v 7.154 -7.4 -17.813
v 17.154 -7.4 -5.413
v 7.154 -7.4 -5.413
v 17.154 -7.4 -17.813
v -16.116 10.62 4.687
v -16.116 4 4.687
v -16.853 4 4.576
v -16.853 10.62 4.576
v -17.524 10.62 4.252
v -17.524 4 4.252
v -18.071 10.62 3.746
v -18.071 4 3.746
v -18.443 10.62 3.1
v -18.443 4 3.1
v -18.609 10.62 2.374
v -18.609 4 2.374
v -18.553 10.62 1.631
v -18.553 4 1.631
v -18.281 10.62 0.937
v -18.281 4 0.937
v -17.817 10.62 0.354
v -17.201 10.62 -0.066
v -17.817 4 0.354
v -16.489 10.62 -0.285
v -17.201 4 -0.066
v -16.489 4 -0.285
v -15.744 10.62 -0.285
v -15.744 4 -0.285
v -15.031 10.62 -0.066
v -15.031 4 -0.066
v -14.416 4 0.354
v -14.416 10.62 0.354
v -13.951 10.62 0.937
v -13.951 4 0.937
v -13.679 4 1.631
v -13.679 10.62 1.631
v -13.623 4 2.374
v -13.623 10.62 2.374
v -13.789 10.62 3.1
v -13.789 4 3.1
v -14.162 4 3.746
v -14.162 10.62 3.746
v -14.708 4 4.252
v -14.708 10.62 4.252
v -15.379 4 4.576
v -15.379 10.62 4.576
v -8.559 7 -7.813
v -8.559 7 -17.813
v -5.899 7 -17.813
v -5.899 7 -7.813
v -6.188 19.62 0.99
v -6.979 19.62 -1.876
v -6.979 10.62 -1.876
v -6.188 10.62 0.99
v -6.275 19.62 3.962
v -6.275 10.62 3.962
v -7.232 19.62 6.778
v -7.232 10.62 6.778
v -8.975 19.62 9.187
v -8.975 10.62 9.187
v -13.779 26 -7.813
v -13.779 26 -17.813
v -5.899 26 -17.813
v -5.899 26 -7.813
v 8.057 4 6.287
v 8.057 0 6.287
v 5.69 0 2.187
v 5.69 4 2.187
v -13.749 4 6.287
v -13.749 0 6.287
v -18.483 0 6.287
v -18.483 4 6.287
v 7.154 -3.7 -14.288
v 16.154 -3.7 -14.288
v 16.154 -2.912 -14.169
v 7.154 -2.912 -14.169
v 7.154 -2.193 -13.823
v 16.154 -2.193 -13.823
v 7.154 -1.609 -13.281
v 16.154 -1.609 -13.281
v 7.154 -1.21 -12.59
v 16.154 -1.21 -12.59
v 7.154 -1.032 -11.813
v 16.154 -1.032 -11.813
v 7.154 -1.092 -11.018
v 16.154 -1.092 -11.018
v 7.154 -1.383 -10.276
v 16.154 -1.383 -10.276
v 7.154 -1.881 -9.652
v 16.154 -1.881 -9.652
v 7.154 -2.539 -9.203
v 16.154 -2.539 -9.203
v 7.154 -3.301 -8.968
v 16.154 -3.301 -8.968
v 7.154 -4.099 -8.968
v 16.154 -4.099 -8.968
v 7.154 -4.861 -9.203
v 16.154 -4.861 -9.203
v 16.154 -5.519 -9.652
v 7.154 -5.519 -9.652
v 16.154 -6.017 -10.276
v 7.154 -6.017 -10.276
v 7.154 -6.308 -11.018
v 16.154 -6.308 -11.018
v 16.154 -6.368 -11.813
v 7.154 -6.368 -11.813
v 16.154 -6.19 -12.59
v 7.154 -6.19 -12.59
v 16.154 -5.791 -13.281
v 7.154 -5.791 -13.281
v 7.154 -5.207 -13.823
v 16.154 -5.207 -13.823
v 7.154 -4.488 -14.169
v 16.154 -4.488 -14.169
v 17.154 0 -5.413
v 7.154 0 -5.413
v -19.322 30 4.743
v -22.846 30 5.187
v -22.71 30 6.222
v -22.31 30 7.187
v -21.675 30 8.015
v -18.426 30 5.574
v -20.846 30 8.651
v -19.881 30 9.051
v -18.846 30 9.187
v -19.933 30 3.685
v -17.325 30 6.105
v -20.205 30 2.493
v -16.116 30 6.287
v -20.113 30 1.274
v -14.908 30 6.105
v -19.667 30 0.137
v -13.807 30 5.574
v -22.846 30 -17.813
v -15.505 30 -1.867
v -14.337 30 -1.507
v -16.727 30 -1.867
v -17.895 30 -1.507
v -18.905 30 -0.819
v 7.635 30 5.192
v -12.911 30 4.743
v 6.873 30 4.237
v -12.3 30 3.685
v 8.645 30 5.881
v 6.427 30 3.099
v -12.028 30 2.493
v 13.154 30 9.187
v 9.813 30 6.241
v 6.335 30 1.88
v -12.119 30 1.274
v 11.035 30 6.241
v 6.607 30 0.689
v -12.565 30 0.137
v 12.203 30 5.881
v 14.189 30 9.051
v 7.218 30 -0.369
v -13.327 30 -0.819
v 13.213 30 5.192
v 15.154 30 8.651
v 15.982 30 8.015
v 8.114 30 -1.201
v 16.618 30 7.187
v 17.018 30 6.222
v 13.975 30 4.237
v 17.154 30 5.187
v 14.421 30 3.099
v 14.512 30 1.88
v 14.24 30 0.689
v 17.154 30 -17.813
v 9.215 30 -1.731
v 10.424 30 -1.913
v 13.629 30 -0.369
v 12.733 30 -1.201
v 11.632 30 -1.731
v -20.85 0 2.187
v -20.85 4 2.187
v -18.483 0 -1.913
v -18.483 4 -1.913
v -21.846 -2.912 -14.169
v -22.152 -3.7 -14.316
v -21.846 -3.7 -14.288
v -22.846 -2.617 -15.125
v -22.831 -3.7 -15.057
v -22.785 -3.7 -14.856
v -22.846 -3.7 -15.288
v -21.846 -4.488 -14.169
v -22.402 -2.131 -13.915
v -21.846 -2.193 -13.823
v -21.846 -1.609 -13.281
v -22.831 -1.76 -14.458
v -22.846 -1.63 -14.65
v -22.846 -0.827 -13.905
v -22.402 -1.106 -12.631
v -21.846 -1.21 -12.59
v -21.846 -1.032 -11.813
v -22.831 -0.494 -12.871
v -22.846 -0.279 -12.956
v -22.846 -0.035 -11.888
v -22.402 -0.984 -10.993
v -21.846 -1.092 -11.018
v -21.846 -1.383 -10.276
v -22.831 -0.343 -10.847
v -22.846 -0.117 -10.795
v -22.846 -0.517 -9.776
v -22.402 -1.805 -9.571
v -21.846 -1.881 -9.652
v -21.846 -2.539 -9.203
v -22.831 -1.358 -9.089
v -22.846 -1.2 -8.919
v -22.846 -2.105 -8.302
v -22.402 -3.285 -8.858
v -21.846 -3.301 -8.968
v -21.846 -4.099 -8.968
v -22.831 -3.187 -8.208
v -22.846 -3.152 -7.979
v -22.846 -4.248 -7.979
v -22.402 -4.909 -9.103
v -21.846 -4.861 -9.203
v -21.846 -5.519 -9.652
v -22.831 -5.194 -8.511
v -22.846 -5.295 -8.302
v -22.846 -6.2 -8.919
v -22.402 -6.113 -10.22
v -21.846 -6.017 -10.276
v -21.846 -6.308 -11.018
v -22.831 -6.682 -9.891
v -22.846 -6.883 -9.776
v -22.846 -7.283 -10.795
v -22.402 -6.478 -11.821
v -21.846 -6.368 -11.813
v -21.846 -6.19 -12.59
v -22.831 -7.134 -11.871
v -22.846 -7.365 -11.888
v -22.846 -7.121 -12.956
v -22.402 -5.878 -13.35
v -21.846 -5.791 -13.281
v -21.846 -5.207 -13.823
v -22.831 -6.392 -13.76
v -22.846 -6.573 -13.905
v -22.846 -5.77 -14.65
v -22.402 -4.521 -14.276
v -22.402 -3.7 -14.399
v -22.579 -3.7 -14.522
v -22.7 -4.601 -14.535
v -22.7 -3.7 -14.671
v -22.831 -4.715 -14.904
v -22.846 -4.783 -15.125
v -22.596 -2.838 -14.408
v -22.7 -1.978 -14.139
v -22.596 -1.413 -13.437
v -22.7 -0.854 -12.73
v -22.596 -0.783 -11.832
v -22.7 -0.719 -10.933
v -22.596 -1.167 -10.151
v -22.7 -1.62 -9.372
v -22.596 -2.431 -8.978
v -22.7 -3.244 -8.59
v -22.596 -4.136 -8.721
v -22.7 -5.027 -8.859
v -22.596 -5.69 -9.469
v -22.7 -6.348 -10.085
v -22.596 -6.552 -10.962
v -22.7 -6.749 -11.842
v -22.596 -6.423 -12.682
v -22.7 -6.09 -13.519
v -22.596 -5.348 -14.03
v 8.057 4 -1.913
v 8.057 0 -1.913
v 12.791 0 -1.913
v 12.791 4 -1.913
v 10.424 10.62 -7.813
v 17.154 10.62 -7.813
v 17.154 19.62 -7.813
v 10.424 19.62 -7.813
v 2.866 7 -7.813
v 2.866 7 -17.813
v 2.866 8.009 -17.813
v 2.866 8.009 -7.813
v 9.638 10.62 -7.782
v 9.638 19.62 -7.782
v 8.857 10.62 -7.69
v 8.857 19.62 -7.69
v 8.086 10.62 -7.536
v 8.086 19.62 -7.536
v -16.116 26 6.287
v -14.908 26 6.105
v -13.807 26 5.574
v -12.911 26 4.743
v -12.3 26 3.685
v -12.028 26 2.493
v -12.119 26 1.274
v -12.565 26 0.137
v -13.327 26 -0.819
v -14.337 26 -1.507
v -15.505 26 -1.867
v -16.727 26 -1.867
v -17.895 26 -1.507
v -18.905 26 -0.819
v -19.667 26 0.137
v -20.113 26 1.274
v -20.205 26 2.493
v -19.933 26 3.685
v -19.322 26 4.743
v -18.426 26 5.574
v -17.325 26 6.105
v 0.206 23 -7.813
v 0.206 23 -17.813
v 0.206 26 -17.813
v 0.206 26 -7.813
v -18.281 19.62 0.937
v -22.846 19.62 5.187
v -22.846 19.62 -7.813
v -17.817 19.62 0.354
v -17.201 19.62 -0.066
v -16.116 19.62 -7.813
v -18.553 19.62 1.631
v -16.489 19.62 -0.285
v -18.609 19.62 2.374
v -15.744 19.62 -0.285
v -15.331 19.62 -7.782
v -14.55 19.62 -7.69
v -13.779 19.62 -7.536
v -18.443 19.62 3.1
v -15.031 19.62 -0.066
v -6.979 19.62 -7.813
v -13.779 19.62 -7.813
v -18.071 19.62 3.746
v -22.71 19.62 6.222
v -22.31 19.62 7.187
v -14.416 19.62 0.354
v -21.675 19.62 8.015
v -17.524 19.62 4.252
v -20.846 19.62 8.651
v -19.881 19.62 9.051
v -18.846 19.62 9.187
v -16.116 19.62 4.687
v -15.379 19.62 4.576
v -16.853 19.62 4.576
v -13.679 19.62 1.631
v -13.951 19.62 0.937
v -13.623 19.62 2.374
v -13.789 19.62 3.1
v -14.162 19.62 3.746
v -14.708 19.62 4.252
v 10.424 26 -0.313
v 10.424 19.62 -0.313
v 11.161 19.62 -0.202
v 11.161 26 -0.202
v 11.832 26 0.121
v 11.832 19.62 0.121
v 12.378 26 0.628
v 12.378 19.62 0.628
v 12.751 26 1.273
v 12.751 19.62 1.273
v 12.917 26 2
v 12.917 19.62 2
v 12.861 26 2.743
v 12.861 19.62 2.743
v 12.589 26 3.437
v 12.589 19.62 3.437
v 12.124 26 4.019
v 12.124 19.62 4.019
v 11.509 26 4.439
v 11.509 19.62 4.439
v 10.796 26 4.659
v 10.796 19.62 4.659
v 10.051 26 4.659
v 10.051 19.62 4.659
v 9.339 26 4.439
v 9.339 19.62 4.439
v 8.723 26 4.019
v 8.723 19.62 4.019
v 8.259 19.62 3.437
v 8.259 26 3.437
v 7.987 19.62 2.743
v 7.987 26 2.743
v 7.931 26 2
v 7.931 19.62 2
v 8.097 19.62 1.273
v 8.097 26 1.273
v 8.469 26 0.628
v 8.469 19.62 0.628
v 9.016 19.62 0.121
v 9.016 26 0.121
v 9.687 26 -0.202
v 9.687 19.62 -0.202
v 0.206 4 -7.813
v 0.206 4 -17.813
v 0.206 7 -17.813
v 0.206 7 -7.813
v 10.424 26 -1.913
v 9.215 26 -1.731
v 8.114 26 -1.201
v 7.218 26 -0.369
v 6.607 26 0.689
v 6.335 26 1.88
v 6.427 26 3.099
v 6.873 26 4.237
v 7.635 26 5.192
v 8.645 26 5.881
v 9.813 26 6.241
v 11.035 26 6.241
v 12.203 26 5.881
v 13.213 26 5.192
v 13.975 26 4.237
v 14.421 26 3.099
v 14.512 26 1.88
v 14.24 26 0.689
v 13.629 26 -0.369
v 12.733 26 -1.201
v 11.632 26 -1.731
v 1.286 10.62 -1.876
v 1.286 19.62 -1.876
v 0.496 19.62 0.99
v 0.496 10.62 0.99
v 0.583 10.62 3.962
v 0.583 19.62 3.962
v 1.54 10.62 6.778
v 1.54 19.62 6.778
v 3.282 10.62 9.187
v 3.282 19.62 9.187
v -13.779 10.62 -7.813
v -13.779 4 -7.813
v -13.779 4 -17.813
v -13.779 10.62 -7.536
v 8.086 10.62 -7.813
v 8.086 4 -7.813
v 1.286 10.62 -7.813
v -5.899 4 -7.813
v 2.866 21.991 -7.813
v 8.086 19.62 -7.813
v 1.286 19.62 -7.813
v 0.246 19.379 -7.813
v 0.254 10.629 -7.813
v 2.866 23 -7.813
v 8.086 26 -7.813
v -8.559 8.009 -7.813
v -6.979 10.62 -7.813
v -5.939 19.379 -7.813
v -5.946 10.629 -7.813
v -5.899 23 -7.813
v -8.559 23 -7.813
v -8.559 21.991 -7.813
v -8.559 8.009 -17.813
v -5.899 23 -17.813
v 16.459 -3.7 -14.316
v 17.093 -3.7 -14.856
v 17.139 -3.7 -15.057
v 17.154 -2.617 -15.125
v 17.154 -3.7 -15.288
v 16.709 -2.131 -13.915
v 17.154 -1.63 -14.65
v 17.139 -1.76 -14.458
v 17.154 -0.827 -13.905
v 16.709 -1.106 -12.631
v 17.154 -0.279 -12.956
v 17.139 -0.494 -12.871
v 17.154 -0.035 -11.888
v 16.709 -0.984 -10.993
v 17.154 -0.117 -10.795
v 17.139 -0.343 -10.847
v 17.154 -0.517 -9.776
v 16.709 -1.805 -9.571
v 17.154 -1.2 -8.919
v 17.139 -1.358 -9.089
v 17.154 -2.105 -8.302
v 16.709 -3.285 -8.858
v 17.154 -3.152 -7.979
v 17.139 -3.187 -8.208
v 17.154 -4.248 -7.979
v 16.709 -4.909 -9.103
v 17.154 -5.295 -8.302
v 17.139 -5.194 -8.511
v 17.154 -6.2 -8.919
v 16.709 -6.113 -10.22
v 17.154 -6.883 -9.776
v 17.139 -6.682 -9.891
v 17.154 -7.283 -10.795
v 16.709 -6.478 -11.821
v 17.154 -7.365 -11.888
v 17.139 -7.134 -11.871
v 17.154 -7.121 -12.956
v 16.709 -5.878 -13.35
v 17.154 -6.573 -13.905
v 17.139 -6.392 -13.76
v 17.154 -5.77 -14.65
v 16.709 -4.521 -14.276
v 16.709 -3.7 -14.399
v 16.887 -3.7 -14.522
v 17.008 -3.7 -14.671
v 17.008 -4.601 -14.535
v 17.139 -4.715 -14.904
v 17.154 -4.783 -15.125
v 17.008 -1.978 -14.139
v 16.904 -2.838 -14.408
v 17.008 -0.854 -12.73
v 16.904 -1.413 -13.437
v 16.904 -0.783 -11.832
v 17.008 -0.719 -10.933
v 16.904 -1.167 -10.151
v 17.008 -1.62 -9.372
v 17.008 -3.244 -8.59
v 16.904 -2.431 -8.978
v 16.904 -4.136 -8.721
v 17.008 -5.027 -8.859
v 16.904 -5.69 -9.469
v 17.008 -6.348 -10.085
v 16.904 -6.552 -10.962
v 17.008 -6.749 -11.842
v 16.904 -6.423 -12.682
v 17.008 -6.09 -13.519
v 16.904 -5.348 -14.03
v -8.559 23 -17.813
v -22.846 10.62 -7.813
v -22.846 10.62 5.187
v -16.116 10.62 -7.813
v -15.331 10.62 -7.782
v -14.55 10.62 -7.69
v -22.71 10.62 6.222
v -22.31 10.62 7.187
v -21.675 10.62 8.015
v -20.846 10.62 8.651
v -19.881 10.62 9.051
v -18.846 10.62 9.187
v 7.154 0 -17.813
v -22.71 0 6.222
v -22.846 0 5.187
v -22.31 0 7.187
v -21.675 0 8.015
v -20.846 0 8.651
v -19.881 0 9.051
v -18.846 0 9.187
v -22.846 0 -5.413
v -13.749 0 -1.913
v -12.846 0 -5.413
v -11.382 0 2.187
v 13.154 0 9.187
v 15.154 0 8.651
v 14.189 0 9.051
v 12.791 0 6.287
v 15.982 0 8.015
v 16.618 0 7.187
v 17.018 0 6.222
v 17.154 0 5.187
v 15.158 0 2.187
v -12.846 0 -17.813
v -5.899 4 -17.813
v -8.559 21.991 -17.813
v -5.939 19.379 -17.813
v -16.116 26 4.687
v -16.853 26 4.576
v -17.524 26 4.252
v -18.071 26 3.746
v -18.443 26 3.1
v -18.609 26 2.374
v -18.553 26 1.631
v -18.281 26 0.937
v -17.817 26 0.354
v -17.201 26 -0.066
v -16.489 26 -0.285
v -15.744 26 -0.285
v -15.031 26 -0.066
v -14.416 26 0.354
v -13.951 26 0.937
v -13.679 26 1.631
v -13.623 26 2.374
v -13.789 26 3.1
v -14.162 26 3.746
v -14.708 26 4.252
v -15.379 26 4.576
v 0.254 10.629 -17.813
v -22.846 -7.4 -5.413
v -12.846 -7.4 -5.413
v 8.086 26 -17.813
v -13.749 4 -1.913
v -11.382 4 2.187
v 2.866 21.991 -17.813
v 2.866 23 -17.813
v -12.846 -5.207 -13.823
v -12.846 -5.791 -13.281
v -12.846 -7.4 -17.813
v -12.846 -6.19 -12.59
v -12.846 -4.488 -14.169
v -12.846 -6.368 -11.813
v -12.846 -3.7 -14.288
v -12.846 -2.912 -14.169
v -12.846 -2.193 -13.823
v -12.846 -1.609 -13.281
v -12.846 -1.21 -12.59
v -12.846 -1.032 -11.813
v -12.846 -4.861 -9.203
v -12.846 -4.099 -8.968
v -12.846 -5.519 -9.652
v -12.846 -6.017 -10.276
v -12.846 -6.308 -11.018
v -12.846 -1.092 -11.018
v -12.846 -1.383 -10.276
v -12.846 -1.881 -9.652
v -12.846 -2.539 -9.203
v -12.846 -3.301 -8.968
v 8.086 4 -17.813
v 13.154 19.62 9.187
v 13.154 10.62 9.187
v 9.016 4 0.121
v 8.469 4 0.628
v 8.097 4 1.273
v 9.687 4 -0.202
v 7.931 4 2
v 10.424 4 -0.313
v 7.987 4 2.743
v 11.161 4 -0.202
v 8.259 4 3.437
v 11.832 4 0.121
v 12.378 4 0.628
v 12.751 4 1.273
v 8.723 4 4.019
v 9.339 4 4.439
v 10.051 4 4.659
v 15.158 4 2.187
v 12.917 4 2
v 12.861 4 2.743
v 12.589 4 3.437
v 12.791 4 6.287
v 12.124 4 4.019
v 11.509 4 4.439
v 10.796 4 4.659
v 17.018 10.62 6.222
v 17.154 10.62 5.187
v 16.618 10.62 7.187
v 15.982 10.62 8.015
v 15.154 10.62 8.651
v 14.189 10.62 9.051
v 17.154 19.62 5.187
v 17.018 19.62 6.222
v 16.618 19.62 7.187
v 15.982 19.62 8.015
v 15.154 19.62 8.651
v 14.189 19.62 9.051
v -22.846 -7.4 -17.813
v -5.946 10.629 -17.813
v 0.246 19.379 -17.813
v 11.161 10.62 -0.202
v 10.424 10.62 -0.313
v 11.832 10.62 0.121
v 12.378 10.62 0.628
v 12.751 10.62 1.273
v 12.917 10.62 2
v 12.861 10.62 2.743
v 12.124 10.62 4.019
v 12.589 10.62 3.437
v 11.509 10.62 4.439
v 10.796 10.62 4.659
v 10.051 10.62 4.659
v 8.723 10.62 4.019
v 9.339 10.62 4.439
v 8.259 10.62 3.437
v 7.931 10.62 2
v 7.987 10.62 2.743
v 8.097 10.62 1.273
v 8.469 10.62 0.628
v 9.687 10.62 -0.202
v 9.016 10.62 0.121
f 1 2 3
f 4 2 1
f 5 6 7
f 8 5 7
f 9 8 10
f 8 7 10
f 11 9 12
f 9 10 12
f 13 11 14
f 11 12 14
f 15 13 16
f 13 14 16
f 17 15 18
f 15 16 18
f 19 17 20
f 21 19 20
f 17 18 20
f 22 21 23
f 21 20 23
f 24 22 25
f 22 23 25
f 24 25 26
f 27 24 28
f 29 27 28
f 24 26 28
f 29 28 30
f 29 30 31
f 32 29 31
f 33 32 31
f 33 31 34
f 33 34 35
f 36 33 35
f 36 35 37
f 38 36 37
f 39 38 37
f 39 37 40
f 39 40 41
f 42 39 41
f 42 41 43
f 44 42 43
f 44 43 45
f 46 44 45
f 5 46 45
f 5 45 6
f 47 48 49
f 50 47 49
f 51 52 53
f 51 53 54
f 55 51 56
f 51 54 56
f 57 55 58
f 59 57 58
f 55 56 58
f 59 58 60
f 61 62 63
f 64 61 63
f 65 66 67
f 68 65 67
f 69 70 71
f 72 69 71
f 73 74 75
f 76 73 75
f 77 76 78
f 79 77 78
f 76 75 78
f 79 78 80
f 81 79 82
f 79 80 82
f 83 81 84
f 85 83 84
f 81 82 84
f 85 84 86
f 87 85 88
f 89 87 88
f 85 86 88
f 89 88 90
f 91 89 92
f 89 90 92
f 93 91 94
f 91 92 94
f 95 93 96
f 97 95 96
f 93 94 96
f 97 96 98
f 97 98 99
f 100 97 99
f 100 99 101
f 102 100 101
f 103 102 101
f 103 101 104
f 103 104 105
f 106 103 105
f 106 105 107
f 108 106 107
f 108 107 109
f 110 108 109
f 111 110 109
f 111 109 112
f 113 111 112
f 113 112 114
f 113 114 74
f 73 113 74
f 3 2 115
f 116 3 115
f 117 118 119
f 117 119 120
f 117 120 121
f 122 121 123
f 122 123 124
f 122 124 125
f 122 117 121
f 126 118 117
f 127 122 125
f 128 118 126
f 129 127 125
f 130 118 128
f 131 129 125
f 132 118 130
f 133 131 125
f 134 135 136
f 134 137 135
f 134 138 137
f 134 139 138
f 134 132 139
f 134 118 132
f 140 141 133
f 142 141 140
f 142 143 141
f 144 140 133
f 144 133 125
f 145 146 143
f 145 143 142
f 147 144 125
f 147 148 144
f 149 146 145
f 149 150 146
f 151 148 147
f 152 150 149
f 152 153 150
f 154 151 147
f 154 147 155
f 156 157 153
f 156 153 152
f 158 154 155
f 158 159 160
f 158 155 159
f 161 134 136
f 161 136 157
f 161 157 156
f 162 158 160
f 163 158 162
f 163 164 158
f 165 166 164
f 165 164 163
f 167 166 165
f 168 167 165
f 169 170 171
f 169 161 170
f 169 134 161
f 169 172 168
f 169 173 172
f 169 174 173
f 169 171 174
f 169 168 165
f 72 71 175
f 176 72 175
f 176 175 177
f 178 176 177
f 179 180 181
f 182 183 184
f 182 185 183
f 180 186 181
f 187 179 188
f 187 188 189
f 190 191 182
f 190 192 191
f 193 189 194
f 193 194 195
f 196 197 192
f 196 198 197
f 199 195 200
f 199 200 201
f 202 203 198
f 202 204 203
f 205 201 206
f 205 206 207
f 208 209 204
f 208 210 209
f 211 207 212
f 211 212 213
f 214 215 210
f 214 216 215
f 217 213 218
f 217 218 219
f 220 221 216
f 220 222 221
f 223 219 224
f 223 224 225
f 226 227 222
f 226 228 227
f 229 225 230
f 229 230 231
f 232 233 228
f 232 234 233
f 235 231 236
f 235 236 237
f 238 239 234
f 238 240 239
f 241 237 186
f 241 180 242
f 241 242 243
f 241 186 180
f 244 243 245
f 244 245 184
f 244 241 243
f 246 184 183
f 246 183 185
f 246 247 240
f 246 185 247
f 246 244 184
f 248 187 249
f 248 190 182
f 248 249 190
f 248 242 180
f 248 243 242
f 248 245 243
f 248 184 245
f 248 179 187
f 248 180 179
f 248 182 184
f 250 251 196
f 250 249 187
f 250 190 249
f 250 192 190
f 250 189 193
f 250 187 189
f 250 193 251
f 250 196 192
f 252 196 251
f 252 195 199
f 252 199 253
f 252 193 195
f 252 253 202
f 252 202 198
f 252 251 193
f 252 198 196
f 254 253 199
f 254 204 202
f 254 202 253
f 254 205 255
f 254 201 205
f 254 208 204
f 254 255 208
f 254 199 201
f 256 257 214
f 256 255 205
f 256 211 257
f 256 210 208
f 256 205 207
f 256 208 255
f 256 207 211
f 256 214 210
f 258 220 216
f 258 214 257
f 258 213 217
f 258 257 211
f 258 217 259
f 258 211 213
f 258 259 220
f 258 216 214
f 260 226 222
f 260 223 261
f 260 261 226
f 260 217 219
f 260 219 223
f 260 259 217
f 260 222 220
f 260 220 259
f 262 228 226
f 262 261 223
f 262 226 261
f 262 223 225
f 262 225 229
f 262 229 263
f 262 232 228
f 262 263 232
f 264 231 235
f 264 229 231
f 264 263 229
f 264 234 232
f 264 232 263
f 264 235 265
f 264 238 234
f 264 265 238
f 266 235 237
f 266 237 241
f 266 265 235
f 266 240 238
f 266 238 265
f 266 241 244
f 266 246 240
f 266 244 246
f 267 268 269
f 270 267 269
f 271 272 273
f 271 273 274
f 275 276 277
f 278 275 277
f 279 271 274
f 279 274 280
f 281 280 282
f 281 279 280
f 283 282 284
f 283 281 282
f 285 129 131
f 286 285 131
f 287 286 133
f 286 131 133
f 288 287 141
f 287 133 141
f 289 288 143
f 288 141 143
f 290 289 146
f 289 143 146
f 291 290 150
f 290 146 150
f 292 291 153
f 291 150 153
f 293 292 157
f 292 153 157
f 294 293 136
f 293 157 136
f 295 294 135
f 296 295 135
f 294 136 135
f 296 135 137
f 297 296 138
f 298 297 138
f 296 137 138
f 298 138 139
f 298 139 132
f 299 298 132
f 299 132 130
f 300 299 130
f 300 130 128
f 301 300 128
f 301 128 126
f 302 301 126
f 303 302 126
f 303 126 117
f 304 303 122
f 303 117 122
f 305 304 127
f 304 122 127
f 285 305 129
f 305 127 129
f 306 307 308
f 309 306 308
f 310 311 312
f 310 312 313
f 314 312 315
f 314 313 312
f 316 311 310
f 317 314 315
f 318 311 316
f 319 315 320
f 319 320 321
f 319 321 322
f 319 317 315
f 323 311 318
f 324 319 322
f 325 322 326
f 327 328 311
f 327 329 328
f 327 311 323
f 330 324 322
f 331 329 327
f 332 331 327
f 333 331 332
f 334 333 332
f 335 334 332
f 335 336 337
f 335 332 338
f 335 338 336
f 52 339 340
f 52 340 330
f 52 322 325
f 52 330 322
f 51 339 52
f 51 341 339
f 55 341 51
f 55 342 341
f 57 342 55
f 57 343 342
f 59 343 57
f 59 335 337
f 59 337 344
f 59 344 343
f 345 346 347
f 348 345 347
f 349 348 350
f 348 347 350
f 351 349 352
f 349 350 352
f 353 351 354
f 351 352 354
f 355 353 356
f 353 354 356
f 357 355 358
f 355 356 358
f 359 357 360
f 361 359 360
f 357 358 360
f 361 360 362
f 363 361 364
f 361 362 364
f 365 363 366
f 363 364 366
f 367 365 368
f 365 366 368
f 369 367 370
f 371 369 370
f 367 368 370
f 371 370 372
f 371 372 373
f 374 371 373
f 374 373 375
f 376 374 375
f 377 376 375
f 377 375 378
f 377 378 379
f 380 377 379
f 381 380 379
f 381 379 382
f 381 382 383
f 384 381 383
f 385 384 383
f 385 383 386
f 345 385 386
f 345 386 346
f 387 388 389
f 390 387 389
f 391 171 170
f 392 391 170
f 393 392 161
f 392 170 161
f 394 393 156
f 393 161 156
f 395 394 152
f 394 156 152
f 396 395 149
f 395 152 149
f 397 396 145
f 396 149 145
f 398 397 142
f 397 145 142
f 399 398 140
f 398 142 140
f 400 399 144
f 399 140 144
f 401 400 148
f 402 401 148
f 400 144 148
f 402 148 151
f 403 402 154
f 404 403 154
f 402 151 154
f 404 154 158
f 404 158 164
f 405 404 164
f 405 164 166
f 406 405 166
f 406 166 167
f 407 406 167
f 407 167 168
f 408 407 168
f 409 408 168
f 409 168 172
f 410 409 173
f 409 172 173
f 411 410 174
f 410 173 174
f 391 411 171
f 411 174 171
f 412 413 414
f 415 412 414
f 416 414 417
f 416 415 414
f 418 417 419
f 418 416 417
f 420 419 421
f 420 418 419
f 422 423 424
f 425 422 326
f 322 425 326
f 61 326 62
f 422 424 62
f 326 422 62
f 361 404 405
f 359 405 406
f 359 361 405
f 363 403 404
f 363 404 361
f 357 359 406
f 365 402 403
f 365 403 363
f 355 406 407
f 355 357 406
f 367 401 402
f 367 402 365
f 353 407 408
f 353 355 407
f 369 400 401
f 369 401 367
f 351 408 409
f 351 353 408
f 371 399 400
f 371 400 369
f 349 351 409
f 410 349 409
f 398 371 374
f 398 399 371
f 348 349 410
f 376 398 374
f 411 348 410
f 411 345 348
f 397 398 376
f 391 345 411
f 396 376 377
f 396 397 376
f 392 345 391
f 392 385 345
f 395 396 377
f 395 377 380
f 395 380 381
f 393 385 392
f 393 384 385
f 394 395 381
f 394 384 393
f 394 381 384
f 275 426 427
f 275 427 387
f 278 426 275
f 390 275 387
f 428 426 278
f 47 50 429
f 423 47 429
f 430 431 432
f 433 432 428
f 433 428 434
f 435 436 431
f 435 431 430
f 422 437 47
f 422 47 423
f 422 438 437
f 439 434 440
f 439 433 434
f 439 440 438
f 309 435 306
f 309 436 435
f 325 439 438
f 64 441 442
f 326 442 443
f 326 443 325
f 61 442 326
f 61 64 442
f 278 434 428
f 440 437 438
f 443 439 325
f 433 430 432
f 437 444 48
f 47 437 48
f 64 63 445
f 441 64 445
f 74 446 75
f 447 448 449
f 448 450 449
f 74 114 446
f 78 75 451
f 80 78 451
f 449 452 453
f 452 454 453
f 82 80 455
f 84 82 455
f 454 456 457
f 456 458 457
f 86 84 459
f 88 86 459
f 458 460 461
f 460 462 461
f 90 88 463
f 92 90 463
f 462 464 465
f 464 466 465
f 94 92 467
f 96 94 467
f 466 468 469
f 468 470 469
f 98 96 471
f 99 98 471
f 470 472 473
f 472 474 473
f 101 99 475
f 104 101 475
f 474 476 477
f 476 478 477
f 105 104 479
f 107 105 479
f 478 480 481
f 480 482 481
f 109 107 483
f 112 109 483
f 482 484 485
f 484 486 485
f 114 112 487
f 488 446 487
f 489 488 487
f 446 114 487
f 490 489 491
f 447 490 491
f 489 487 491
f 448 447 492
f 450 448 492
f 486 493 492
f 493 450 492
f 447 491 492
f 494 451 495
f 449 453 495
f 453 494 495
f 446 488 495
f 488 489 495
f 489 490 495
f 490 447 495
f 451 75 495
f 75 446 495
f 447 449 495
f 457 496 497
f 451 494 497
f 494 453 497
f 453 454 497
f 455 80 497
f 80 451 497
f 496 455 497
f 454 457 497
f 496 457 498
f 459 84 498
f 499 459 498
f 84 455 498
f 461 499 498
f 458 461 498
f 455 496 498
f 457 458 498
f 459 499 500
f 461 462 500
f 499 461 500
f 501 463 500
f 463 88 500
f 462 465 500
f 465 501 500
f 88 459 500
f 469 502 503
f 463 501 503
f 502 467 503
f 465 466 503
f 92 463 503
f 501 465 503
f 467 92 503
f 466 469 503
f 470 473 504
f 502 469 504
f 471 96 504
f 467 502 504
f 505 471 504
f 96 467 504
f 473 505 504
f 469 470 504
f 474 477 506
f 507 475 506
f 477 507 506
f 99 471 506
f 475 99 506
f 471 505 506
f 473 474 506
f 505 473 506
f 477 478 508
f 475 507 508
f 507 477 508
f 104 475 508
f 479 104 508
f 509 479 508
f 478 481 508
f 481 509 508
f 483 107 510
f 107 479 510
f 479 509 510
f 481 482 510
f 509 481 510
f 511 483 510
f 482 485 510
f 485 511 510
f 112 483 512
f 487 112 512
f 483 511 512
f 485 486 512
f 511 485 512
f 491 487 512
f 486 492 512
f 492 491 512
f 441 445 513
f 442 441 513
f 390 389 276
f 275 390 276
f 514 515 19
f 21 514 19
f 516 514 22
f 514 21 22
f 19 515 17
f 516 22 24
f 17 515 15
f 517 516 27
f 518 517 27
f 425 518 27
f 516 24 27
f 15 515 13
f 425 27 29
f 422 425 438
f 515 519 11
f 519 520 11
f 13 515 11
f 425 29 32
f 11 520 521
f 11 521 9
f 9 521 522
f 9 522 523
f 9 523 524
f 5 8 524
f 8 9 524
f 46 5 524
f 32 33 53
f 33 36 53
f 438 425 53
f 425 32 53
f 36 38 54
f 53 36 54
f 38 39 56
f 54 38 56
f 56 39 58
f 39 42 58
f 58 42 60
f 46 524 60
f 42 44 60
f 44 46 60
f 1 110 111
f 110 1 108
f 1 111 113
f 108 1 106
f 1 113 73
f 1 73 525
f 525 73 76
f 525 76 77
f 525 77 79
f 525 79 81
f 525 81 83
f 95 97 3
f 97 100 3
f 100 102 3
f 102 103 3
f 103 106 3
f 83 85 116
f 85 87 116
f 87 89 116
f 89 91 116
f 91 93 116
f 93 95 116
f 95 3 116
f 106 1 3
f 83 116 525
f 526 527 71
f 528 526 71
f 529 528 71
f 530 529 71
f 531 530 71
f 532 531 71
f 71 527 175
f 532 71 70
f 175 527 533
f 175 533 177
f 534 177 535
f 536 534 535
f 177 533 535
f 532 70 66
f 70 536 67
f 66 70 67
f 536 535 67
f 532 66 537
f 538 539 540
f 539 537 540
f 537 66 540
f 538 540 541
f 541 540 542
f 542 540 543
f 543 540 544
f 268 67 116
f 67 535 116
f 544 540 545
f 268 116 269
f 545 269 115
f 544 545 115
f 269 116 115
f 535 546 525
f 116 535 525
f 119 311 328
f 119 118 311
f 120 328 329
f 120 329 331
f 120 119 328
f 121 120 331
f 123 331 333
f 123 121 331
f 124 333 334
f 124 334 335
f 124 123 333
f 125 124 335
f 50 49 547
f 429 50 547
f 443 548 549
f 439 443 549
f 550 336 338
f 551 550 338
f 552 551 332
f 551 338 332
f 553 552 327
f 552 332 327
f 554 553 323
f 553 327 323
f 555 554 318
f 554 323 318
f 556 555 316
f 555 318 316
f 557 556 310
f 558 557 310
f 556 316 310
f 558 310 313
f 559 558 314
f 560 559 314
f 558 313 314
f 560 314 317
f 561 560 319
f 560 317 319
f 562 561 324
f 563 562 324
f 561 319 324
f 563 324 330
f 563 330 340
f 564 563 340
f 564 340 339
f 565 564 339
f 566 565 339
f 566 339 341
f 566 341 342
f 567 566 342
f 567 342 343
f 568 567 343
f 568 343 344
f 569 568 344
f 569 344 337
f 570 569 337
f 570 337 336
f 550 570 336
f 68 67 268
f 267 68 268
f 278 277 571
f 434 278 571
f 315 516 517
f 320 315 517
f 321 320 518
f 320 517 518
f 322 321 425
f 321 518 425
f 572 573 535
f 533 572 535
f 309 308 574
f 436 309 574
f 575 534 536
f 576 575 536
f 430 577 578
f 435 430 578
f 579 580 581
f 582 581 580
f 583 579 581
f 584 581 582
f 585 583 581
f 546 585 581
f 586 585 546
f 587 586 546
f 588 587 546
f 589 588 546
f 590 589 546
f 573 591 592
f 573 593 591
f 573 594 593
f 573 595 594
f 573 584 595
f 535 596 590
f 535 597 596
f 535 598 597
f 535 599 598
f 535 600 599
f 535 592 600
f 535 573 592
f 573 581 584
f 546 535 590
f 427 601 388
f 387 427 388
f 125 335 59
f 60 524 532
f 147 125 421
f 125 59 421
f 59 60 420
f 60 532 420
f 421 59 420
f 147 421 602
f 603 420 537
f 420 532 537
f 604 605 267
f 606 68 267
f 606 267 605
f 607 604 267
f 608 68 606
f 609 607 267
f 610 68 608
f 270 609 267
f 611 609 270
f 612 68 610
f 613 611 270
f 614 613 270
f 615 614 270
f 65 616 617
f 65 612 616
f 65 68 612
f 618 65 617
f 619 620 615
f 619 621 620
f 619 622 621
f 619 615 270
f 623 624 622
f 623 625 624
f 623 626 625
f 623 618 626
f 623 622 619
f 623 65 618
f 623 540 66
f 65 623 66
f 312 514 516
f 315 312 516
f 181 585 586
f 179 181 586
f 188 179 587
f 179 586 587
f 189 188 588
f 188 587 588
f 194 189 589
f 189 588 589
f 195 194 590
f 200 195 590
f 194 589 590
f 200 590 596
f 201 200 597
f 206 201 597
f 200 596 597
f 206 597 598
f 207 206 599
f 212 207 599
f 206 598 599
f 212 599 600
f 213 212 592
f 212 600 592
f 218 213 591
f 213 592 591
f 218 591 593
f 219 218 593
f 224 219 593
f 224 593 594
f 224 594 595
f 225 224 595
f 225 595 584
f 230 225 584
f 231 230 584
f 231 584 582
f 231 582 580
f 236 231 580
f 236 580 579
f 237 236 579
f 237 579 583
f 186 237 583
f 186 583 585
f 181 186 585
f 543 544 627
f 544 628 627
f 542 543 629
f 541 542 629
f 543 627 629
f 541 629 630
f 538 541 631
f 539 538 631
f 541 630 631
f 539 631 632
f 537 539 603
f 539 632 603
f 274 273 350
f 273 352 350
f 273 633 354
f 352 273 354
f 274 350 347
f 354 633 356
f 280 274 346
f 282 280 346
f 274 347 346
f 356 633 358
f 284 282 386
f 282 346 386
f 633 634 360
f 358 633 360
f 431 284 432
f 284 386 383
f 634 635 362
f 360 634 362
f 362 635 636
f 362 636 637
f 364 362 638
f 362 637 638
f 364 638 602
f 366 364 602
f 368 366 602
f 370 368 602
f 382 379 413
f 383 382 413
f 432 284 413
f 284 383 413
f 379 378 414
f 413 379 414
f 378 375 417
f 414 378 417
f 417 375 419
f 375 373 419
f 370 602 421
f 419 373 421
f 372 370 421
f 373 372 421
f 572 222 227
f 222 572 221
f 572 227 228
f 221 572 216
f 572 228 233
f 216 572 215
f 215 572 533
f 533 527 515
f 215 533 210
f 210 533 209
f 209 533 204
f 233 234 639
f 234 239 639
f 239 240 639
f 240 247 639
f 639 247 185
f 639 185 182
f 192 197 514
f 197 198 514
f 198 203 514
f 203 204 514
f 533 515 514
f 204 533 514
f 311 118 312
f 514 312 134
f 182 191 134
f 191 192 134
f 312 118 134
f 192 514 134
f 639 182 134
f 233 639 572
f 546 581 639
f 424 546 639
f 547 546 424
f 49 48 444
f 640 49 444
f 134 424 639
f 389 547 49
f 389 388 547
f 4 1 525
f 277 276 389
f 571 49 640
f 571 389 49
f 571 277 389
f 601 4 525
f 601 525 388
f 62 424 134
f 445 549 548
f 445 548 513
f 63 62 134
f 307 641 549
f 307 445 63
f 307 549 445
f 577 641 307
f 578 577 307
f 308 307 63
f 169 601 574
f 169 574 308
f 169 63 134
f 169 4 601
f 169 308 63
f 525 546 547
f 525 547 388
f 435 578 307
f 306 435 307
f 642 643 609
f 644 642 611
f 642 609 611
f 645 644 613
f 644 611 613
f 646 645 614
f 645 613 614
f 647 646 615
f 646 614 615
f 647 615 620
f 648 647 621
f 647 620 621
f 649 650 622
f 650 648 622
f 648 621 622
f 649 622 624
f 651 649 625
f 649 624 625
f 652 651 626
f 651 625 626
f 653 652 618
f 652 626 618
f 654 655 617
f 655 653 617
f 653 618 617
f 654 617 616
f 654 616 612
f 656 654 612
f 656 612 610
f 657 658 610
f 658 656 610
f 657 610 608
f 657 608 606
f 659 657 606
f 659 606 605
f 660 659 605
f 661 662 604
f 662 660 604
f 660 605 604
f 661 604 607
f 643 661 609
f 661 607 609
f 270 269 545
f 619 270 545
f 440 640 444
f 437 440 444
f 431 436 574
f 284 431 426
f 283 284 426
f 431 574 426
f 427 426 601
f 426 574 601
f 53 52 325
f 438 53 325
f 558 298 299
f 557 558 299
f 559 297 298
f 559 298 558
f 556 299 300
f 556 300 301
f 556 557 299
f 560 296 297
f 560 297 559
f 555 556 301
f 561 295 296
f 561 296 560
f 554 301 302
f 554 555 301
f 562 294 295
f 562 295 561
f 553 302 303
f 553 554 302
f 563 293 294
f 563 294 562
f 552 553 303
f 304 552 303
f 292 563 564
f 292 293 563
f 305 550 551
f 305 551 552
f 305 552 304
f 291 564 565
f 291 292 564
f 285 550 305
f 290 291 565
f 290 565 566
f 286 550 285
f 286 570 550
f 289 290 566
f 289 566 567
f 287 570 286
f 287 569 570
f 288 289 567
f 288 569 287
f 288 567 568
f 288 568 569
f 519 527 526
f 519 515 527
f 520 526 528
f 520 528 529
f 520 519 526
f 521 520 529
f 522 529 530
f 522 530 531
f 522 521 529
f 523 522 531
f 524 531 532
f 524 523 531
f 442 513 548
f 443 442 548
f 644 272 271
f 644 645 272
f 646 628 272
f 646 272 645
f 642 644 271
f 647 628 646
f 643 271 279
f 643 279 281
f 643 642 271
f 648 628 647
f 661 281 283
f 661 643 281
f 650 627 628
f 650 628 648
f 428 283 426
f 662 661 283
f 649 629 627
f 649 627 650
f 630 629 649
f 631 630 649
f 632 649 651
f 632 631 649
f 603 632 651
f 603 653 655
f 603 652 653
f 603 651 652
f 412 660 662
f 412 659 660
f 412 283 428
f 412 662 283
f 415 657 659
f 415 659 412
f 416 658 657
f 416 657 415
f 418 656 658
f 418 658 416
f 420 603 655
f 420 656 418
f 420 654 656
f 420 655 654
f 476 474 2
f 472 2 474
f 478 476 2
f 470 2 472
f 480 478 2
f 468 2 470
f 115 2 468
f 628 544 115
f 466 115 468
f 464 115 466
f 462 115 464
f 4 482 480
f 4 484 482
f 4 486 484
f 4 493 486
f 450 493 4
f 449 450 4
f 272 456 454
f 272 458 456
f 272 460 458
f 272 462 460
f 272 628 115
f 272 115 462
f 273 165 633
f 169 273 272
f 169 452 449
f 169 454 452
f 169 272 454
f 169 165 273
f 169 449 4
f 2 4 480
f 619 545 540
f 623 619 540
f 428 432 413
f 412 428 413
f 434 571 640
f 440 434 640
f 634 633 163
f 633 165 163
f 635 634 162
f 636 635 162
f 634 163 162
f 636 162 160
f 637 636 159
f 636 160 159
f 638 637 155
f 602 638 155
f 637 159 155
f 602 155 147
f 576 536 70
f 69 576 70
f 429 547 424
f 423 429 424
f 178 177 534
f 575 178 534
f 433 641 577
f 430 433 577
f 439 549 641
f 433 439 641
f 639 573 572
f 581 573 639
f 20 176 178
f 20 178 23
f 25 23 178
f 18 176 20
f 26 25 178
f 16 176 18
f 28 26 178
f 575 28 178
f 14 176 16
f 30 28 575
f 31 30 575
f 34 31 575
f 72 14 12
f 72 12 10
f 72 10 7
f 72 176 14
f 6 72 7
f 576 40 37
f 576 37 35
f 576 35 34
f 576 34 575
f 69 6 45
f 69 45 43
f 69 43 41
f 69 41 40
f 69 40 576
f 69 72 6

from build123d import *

# Parameters (mm, degrees)
SKETCH1_W           = 40
SKETCH1_H           = 27
BOSS_EXTRUDE1_DEPTH = 30
CUT_EXTRUDE1_DEPTH  = 10
SKETCH3_R           = 2.5
CUT_EXTRUDE2_DEPTH  = 30
CUT_EXTRUDE5_START  = -10.62
CUT_EXTRUDE5_DEPTH  = 9
SKETCH10_W          = 20
SKETCH10_H          = 9
CUT_EXTRUDE7_DEPTH  = 6.8
SKETCH12_W          = 20
SKETCH12_H          = 9
CUT_EXTRUDE10_DEPTH = 6.8
FILLET1_R           = 4
SKETCH13_W          = 12.4
SKETCH13_H          = 7.4
SKETCH13_R          = 2.675
BOSS_EXTRUDE2_DEPTH = 40
CUT_EXTRUDE11_REACH = 42.436
SKETCH14_W          = 20
SKETCH14_H          = 7.4
SKETCH15_R          = 4.1
CUT_EXTRUDE12_DEPTH = 4
SKETCH16_R          = 2.5
CUT_EXTRUDE13_DEPTH = 4
FILLET2_SIZE        = 1


with BuildPart() as part:
    # Sketch1 → Boss-Extrude1 (new body)
    with BuildSketch(Plane(origin=(0, 0, 0), x_dir=(1, 0, 0), z_dir=(0, 1, 0))):
        with Locations((-2.846153846, 4.313186813)):
            Rectangle(SKETCH1_W, SKETCH1_H)
    extrude(amount=BOSS_EXTRUDE1_DEPTH)

    # Sketch2 → Cut-Extrude1 (cut)
    with BuildSketch(Plane(origin=(0, 0, -17.813186813), x_dir=(-1, 0, 0), z_dir=(0, 0, -1))):
        Polygon((-8.086431081, 26), (-8.086431081, 4), (-0.206431081, 4), (-0.206431081, 7), (-2.866431081, 7), (-2.866431081, 8.008707537), (-0.253846154, 10.628707537), (5.946153846, 10.628707537), (8.558738773, 8.008707537), (8.558738773, 7), (5.898738773, 7), (5.898738773, 4), (13.778738773, 4), (13.778738773, 26), (5.898738773, 26), (5.898738773, 23), (8.558738773, 23), (8.558738773, 21.991292463), (5.938738773, 19.378707537), (-0.246431081, 19.378707537), (-2.866431081, 21.991292463), (-2.866431081, 23), (-0.206431081, 23), (-0.206431081, 26), align=None)
    extrude(amount=-CUT_EXTRUDE1_DEPTH, mode=Mode.SUBTRACT)

    # Sketch3 → Cut-Extrude2 (cut)
    with BuildSketch(Plane.XZ):
        with Locations(Location((10.423846154, 2.186813187, 0), (0, 0, 270))):
            Circle(SKETCH3_R)
        with Locations(Location((-16.116153846, 2.186813187, 0), (0, 0, 90))):
            Circle(SKETCH3_R)
    extrude(amount=-CUT_EXTRUDE2_DEPTH, mode=Mode.SUBTRACT)

    # Sketch8 → Cut-Extrude5 (cut)
    with BuildSketch(Plane.XZ.offset(CUT_EXTRUDE5_START)):
        with BuildLine():
            Line((3.282417725, 9.186813187), (17.153846154, 9.186813187))
            Line((17.153846154, 9.186813187), (17.153846154, -7.813186813))
            Line((17.153846154, -7.813186813), (10.423846154, -7.813186813))
            ThreePointArc((10.423846154, -7.813186813), (1.204301697, -1.686170159), (3.282417725, 9.186813187))
        make_face()
        with BuildLine():
            Line((-22.846153846, -7.813186813), (-16.116153846, -7.813186813))
            ThreePointArc((-16.116153846, -7.813186813), (-6.896609389, -1.686170159), (-8.974725418, 9.186813187))
            Line((-8.974725418, 9.186813187), (-22.846153846, 9.186813187))
            Line((-22.846153846, 9.186813187), (-22.846153846, -7.813186813))
        make_face()
    extrude(amount=-CUT_EXTRUDE5_DEPTH, mode=Mode.SUBTRACT)

    # Sketch10 → Cut-Extrude7 (cut)
    with BuildSketch(Plane.ZY.offset(-8.086431081)):
        with Locations((-7.813186813, 15.12)):
            Rectangle(SKETCH10_W, SKETCH10_H)
    extrude(amount=CUT_EXTRUDE7_DEPTH, mode=Mode.SUBTRACT)

    # Sketch12 → Cut-Extrude10 (cut)
    with BuildSketch(Plane(origin=(-13.778738773, 0, 0), x_dir=(0, 0, -1), z_dir=(1, 0, 0))):
        with Locations((7.813186813, 15.12)):
            Rectangle(SKETCH12_W, SKETCH12_H)
    extrude(amount=CUT_EXTRUDE10_DEPTH, mode=Mode.SUBTRACT)

    # Fillet1
    fillet1_edges = [part.edges().sort_by_distance(p)[0] for p in [
        (17.153846154, 24.81, 9.186813187),
        (-22.846153846, 24.81, 9.186813187),
        (17.153846154, 5.31, 9.186813187),
        (-22.846153846, 5.31, 9.186813187),
    ]]
    fillet(fillet1_edges, radius=FILLET1_R)

    # Sketch13 → Boss-Extrude2 (add)
    with BuildSketch(Plane(origin=(17.153846154, 0, 0), x_dir=(0, 0, -1), z_dir=(1, 0, 0))):
        with Locations((11.613186813, -3.7)):
            Rectangle(SKETCH13_W, SKETCH13_H)
        with Locations((11.613186813, -3.7)):
            Circle(SKETCH13_R, mode=Mode.SUBTRACT)
    extrude(amount=-BOSS_EXTRUDE2_DEPTH)

    # Sketch14 → Cut-Extrude11 (cut, up to next)
    with BuildSketch(Plane.XY.offset(-5.413186813), mode=Mode.PRIVATE) as cut_extrude11_sk1:
        with Locations((-2.846153846, -3.7)):
            Rectangle(SKETCH14_W, SKETCH14_H)
    cut_extrude11_tool1 = extrude(cut_extrude11_sk1.sketch, amount=-CUT_EXTRUDE11_REACH, mode=Mode.PRIVATE) & part.part
    add(cut_extrude11_tool1.solids().sort_by_distance((-2.846154, -3.7, -5.413187))[0], mode=Mode.SUBTRACT)

    # Sketch15 → Cut-Extrude12 (cut)
    with BuildSketch(Plane(origin=(0, 30, 0), x_dir=(1, 0, 0), z_dir=(0, 1, 0))):
        with Locations(Location((-16.116153846, -2.186813187, 0), (0, 0, 270))):
            Circle(SKETCH15_R)
        with Locations(Location((10.423846154, -2.186813187, 0), (0, 0, 90))):
            Circle(SKETCH15_R)
    extrude(amount=-CUT_EXTRUDE12_DEPTH, mode=Mode.SUBTRACT)

    # Sketch16 → Cut-Extrude13 (cut)
    # profile 1 of 2: a face of its own
    with BuildSketch(Plane.XZ):
        Polygon((-13.749017742, -1.913186813), (-11.381881639, 2.186813187), (-13.749017742, 6.286813187), (-18.48328995, 6.286813187), (-20.850426054, 2.186813187), (-18.48328995, -1.913186813), align=None)
        with Locations(Location((-16.116153846, 2.186813187, 0), (0, 0, 270))):
            Circle(SKETCH16_R, mode=Mode.SUBTRACT)
    # profile 2 of 2: a face of its own
    with BuildSketch(Plane.XZ):
        Polygon((12.790982258, -1.913186813), (15.158118361, 2.186813187), (12.790982258, 6.286813187), (8.05671005, 6.286813187), (5.689573946, 2.186813187), (8.05671005, -1.913186813), align=None)
        with Locations(Location((10.423846154, 2.186813187, 0), (0, 0, 270))):
            Circle(SKETCH16_R, mode=Mode.SUBTRACT)
    extrude(amount=-CUT_EXTRUDE13_DEPTH, mode=Mode.SUBTRACT)

    # Fillet2
    # a fillet whose section is not a circle: 1 mm, written as the material it takes off along each edge
    with BuildSketch(Plane(origin=(-22.846153846, -3.7, -11.613186813), x_dir=(0, 0, -1), z_dir=(0, -1, 0))) as fillet2_piece_1:
        with BuildLine():
            Bezier((2.675, FILLET2_SIZE), (2.675, 0), (2.675 + FILLET2_SIZE, 0), weights=[1, 1, 1])
            Line((2.675 + FILLET2_SIZE, 0), (2.675, 0))
            Line((2.675, 0), (2.675, FILLET2_SIZE))
        make_face()
    revolve(axis=Axis((-22.846153846, -3.7, -11.613186813), (1, 0, 0)), mode=Mode.SUBTRACT)
    with BuildSketch(Plane(origin=(17.153846154, -3.7, -11.613186813), x_dir=(0, 0, -1), z_dir=(0, -1, 0))) as fillet2_piece_2:
        with BuildLine():
            Bezier((2.675, -FILLET2_SIZE), (2.675, 0), (2.675 + FILLET2_SIZE, 0), weights=[1, 1, 1])
            Line((2.675 + FILLET2_SIZE, 0), (2.675, 0))
            Line((2.675, 0), (2.675, -FILLET2_SIZE))
        make_face()
    revolve(axis=Axis((17.153846154, -3.7, -11.613186813), (1, 0, 0)), mode=Mode.SUBTRACT)


solid = part.part
